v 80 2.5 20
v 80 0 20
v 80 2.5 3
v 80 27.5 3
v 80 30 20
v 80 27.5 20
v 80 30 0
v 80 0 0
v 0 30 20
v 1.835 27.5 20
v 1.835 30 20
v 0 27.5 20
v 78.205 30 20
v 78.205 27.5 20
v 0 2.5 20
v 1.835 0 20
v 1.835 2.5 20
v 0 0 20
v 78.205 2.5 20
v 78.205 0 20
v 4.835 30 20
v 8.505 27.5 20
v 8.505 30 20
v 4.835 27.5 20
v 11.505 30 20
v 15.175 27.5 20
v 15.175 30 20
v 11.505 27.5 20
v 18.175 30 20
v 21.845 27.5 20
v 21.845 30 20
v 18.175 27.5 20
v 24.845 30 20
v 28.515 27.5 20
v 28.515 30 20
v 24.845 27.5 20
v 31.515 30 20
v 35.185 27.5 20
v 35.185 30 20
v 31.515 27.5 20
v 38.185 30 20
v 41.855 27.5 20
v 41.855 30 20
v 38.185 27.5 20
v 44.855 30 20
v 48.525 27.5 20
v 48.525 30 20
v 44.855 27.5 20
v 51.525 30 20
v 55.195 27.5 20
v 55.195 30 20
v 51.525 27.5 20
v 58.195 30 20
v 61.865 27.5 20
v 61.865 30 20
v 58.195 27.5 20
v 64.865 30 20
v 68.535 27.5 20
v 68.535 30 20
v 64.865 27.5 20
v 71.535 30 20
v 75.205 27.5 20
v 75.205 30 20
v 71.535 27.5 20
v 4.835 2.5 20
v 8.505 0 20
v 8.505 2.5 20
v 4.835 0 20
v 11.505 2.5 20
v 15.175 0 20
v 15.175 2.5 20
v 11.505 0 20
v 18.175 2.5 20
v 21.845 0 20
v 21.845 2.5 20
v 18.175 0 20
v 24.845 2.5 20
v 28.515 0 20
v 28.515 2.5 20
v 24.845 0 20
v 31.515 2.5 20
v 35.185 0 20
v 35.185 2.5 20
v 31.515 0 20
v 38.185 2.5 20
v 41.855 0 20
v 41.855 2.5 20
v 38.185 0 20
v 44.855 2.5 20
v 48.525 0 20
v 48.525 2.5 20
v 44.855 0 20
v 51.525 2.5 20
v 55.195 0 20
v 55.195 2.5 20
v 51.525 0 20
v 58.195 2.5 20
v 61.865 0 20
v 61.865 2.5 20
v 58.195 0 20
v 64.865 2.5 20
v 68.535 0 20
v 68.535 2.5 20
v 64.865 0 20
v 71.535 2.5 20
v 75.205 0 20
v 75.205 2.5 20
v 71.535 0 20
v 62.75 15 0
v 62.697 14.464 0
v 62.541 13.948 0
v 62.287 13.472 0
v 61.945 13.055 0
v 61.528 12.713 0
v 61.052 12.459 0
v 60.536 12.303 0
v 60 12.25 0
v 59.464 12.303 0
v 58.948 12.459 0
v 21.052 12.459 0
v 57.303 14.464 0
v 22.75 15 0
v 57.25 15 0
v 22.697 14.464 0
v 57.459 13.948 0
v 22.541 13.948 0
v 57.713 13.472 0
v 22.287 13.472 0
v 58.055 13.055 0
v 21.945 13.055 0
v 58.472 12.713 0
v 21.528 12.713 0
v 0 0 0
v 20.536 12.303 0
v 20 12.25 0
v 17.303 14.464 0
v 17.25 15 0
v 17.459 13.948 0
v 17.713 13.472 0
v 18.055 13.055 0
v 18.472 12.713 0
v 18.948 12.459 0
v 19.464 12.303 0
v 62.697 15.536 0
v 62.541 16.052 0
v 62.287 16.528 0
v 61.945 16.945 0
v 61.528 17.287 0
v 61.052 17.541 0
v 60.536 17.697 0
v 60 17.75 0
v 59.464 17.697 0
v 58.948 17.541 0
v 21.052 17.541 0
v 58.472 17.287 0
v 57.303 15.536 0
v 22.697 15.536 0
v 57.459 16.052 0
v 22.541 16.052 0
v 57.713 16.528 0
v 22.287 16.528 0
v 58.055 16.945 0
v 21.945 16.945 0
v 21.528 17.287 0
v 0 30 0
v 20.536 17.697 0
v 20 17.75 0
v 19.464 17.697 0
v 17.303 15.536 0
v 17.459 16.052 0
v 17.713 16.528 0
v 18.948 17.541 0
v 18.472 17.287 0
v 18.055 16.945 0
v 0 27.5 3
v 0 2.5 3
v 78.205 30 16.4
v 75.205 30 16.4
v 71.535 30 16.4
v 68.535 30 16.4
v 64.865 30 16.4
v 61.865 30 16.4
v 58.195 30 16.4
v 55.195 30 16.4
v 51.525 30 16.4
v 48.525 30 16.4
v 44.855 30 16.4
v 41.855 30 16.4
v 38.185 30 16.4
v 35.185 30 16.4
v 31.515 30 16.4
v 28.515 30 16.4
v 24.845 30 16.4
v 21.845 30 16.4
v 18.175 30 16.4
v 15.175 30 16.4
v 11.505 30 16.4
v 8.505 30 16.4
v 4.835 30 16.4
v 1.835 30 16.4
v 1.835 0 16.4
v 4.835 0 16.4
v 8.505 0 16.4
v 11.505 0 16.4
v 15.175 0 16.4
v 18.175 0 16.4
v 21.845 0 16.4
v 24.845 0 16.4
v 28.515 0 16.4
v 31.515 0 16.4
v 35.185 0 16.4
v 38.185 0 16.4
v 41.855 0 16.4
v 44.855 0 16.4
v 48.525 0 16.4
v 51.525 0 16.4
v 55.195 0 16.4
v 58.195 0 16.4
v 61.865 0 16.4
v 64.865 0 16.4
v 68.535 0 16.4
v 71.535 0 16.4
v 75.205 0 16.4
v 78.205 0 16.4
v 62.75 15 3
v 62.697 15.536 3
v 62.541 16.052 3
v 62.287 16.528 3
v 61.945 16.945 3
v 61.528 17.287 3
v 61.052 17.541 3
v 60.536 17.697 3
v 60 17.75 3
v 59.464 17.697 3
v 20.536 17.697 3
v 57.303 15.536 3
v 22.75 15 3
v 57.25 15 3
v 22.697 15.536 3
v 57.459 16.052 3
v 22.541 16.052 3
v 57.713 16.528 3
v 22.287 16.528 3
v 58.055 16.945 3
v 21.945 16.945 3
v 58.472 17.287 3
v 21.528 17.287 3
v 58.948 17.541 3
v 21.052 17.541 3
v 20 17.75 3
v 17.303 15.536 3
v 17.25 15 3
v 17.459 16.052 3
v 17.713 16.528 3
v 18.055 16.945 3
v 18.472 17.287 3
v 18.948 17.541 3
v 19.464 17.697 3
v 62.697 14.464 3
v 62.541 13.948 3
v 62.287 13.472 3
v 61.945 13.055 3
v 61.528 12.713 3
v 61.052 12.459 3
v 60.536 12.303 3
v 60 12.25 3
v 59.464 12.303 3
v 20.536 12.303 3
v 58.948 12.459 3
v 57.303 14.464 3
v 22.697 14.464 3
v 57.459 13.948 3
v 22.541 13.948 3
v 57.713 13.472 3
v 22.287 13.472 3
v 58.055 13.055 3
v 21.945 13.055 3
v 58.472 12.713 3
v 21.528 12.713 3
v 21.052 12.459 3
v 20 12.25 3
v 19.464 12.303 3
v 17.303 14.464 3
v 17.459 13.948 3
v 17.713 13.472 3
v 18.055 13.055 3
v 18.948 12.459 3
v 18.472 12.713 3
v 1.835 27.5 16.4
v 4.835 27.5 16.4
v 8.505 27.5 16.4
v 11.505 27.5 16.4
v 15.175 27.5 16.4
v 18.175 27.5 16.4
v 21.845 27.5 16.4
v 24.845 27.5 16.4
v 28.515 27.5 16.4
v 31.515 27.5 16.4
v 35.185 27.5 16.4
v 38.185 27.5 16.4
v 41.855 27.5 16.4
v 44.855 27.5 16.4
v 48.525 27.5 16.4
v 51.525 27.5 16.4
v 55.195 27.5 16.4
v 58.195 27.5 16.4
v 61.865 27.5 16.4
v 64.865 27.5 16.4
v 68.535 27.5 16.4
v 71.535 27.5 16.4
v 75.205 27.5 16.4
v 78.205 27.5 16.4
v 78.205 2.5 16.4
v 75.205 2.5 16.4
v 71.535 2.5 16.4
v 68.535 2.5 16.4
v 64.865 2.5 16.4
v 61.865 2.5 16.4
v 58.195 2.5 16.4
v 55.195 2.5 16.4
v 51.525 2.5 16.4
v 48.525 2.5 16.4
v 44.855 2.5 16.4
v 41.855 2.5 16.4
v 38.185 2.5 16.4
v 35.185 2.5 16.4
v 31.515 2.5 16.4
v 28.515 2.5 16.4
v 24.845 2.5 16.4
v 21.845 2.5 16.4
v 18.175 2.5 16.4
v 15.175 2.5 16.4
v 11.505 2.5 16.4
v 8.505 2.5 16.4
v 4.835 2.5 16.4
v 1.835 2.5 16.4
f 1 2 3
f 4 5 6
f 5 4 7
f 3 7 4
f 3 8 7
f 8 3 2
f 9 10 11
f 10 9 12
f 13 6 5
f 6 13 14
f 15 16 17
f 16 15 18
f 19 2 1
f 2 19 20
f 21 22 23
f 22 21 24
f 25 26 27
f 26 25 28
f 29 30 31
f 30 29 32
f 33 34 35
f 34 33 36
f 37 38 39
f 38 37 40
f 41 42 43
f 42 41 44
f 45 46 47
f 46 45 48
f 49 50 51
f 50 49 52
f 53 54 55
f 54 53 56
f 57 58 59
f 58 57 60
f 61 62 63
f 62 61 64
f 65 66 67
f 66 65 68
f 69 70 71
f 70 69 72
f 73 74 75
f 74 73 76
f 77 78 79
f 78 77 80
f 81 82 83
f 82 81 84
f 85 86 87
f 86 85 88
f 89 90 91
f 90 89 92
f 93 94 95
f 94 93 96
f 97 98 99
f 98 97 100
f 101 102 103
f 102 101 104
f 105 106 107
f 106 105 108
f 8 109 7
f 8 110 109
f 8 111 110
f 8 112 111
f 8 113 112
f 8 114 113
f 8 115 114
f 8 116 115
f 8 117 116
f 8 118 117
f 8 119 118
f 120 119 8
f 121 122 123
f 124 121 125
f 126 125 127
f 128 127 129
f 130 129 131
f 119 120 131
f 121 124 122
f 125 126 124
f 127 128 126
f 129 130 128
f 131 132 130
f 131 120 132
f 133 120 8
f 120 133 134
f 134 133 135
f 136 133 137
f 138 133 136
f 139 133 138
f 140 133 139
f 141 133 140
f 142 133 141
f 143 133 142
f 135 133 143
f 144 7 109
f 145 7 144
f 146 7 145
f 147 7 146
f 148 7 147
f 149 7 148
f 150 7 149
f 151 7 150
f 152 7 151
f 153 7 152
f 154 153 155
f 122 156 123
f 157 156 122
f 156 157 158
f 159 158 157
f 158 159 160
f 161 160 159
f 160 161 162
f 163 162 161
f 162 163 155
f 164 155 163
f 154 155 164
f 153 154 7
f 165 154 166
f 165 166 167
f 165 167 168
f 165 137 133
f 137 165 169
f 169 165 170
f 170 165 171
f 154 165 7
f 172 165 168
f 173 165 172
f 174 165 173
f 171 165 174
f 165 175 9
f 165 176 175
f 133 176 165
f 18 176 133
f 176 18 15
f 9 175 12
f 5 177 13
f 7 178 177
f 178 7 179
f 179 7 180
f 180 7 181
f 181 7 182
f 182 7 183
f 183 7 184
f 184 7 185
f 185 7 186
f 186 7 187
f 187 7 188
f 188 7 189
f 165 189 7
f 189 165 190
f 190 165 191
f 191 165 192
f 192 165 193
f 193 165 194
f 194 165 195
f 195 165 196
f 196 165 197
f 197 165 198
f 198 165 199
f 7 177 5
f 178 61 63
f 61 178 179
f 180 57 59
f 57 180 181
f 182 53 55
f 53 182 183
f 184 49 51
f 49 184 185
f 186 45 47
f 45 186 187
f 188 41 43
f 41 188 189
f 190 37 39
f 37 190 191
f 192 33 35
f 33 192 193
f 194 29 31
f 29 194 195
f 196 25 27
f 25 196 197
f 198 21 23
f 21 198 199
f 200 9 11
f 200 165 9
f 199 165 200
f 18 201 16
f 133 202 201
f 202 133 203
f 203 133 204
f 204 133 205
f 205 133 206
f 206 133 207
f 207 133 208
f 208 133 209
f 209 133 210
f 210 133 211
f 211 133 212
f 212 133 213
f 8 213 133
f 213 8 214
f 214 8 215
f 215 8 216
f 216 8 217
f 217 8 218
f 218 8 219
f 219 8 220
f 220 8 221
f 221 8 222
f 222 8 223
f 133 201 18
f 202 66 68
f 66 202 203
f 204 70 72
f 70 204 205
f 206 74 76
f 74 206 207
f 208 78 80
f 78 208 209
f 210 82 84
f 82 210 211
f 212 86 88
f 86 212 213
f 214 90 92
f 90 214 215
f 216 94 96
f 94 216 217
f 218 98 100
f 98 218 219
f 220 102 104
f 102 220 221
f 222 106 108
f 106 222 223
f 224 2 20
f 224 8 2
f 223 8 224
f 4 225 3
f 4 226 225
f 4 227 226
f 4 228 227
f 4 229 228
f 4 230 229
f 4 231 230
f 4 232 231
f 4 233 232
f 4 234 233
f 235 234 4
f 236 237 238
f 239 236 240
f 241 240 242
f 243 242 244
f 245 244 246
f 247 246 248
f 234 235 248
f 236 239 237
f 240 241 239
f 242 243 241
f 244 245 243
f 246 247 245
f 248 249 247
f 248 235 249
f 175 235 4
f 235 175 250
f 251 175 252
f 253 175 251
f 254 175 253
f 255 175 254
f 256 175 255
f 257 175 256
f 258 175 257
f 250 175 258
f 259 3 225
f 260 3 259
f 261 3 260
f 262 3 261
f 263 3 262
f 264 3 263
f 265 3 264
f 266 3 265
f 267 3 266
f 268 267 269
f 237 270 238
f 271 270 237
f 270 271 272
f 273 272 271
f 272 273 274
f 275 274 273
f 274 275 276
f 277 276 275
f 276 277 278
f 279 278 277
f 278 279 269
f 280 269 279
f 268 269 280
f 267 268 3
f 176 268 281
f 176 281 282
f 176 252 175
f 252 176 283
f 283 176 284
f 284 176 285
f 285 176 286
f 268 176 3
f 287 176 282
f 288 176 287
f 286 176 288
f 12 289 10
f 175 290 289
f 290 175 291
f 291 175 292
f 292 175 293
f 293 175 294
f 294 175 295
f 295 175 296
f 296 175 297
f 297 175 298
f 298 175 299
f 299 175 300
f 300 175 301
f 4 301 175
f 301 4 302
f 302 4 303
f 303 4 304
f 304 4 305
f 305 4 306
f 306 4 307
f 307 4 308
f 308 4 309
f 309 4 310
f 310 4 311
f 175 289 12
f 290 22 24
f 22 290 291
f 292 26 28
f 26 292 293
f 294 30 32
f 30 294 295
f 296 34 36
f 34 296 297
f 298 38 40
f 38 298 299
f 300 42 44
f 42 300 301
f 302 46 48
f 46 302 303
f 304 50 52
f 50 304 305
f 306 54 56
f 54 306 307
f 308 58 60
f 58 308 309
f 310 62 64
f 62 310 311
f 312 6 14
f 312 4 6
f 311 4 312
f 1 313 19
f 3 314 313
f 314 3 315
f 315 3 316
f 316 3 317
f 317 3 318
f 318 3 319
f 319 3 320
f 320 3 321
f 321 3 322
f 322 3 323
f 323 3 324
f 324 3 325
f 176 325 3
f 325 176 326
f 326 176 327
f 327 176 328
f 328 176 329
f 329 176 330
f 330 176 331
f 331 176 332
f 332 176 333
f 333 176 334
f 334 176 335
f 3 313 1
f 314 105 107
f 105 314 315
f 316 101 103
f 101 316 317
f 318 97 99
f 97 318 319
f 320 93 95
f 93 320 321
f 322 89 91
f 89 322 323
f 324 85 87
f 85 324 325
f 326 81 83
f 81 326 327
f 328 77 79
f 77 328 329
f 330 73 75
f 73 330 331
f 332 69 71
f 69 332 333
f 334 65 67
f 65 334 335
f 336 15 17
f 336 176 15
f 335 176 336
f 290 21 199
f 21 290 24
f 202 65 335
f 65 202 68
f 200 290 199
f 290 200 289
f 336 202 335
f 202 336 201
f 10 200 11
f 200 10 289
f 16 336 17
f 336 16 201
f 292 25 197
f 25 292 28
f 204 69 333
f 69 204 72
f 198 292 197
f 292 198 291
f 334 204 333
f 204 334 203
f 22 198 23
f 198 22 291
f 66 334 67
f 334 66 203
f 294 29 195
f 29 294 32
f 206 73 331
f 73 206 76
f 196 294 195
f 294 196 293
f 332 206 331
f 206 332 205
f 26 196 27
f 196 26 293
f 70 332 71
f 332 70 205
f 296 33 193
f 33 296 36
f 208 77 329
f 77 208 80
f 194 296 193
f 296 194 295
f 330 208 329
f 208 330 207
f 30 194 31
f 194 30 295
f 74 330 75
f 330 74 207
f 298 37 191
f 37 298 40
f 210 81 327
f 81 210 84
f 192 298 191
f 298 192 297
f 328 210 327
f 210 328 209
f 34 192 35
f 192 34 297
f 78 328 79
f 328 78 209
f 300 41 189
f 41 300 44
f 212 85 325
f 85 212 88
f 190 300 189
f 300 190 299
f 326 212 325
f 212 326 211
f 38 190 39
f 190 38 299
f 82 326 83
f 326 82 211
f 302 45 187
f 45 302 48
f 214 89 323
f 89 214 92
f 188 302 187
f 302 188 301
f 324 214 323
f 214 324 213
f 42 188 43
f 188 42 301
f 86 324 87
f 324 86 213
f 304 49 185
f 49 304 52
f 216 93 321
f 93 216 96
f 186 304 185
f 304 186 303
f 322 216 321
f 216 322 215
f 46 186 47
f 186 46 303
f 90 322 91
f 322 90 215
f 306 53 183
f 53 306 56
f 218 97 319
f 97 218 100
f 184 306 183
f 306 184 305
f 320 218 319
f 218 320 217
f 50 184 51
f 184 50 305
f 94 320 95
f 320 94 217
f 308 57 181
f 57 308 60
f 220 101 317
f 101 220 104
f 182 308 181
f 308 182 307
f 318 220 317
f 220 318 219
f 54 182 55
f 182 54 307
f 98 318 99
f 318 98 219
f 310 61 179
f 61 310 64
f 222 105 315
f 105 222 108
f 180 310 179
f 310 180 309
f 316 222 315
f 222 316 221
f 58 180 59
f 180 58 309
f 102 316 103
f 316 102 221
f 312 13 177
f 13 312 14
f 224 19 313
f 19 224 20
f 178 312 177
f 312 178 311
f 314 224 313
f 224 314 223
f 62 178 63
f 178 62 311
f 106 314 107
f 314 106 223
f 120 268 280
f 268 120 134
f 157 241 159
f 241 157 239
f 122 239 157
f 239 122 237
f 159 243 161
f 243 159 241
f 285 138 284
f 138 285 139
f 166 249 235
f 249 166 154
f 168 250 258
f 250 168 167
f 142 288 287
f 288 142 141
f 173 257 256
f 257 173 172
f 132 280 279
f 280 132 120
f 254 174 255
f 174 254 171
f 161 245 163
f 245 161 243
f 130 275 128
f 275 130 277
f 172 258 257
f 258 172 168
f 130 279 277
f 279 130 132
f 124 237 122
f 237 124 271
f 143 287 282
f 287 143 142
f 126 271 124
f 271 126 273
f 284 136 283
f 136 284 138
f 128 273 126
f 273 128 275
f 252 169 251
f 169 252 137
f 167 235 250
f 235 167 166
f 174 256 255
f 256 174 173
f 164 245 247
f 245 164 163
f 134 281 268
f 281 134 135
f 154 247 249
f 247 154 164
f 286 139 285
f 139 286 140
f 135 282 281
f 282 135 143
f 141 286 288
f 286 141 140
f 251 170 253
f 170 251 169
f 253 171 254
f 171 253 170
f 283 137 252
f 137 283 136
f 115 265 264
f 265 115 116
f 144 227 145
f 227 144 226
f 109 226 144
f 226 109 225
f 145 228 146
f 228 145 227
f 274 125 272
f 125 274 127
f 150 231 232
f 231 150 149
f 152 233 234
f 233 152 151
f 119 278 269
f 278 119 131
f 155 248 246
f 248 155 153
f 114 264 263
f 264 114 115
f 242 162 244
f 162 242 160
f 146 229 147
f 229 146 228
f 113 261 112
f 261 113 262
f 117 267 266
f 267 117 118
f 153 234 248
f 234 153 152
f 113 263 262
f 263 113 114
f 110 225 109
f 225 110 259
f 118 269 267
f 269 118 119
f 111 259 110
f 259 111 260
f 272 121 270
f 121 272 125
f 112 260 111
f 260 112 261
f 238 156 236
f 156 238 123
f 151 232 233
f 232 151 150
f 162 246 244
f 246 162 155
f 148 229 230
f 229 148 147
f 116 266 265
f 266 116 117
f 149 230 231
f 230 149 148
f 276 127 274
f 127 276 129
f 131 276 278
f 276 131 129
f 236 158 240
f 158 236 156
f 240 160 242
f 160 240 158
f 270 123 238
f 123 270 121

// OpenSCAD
$fn = 32;

// ----------------------------------------------------------------------
// Cable duct: 80 x 30 x 20 mm, 12 fingers
// ----------------------------------------------------------------------

// --- parameters (mm) ---
duct_len = 80;            // duct length, X
duct_w = 30;              // duct width, Y
duct_h = 20;              // duct height, Z
wall_t = 2.5;             // side wall thickness
floor_t = 3;              // floor thickness
slot_w = 3;               // finger slot width
slot_h = 13.4;            // finger slot height
fingers = 12;             // number of finger slots per side
pitch = 6.67;             // finger pitch
hole_d = 5.5;             // floor mounting hole
hole_n = 2;               // mounting holes in the floor

module shell() {
  difference() {
    cube([duct_len, duct_w, duct_h]);
    /* open top channel */
    translate([-wall_t - 1, wall_t, floor_t])
      cube([duct_len + 2 * wall_t + 2, duct_w - 2 * wall_t, duct_h + 1]);
  }
}

difference() {
  union() {
    shell();
  }
  /* finger slots cut through both side walls */
  for (i = [0 : fingers - 1]) translate([pitch / 2 + i * pitch - slot_w / 2, -1, floor_t + slot_h]) cube([slot_w, duct_w + 2, duct_h]);
  for (i = [0 : hole_n - 1]) translate([(duct_len / hole_n) * (i + 0.5), duct_w / 2, -1]) cylinder(h = floor_t + 2, d = hole_d);
}
